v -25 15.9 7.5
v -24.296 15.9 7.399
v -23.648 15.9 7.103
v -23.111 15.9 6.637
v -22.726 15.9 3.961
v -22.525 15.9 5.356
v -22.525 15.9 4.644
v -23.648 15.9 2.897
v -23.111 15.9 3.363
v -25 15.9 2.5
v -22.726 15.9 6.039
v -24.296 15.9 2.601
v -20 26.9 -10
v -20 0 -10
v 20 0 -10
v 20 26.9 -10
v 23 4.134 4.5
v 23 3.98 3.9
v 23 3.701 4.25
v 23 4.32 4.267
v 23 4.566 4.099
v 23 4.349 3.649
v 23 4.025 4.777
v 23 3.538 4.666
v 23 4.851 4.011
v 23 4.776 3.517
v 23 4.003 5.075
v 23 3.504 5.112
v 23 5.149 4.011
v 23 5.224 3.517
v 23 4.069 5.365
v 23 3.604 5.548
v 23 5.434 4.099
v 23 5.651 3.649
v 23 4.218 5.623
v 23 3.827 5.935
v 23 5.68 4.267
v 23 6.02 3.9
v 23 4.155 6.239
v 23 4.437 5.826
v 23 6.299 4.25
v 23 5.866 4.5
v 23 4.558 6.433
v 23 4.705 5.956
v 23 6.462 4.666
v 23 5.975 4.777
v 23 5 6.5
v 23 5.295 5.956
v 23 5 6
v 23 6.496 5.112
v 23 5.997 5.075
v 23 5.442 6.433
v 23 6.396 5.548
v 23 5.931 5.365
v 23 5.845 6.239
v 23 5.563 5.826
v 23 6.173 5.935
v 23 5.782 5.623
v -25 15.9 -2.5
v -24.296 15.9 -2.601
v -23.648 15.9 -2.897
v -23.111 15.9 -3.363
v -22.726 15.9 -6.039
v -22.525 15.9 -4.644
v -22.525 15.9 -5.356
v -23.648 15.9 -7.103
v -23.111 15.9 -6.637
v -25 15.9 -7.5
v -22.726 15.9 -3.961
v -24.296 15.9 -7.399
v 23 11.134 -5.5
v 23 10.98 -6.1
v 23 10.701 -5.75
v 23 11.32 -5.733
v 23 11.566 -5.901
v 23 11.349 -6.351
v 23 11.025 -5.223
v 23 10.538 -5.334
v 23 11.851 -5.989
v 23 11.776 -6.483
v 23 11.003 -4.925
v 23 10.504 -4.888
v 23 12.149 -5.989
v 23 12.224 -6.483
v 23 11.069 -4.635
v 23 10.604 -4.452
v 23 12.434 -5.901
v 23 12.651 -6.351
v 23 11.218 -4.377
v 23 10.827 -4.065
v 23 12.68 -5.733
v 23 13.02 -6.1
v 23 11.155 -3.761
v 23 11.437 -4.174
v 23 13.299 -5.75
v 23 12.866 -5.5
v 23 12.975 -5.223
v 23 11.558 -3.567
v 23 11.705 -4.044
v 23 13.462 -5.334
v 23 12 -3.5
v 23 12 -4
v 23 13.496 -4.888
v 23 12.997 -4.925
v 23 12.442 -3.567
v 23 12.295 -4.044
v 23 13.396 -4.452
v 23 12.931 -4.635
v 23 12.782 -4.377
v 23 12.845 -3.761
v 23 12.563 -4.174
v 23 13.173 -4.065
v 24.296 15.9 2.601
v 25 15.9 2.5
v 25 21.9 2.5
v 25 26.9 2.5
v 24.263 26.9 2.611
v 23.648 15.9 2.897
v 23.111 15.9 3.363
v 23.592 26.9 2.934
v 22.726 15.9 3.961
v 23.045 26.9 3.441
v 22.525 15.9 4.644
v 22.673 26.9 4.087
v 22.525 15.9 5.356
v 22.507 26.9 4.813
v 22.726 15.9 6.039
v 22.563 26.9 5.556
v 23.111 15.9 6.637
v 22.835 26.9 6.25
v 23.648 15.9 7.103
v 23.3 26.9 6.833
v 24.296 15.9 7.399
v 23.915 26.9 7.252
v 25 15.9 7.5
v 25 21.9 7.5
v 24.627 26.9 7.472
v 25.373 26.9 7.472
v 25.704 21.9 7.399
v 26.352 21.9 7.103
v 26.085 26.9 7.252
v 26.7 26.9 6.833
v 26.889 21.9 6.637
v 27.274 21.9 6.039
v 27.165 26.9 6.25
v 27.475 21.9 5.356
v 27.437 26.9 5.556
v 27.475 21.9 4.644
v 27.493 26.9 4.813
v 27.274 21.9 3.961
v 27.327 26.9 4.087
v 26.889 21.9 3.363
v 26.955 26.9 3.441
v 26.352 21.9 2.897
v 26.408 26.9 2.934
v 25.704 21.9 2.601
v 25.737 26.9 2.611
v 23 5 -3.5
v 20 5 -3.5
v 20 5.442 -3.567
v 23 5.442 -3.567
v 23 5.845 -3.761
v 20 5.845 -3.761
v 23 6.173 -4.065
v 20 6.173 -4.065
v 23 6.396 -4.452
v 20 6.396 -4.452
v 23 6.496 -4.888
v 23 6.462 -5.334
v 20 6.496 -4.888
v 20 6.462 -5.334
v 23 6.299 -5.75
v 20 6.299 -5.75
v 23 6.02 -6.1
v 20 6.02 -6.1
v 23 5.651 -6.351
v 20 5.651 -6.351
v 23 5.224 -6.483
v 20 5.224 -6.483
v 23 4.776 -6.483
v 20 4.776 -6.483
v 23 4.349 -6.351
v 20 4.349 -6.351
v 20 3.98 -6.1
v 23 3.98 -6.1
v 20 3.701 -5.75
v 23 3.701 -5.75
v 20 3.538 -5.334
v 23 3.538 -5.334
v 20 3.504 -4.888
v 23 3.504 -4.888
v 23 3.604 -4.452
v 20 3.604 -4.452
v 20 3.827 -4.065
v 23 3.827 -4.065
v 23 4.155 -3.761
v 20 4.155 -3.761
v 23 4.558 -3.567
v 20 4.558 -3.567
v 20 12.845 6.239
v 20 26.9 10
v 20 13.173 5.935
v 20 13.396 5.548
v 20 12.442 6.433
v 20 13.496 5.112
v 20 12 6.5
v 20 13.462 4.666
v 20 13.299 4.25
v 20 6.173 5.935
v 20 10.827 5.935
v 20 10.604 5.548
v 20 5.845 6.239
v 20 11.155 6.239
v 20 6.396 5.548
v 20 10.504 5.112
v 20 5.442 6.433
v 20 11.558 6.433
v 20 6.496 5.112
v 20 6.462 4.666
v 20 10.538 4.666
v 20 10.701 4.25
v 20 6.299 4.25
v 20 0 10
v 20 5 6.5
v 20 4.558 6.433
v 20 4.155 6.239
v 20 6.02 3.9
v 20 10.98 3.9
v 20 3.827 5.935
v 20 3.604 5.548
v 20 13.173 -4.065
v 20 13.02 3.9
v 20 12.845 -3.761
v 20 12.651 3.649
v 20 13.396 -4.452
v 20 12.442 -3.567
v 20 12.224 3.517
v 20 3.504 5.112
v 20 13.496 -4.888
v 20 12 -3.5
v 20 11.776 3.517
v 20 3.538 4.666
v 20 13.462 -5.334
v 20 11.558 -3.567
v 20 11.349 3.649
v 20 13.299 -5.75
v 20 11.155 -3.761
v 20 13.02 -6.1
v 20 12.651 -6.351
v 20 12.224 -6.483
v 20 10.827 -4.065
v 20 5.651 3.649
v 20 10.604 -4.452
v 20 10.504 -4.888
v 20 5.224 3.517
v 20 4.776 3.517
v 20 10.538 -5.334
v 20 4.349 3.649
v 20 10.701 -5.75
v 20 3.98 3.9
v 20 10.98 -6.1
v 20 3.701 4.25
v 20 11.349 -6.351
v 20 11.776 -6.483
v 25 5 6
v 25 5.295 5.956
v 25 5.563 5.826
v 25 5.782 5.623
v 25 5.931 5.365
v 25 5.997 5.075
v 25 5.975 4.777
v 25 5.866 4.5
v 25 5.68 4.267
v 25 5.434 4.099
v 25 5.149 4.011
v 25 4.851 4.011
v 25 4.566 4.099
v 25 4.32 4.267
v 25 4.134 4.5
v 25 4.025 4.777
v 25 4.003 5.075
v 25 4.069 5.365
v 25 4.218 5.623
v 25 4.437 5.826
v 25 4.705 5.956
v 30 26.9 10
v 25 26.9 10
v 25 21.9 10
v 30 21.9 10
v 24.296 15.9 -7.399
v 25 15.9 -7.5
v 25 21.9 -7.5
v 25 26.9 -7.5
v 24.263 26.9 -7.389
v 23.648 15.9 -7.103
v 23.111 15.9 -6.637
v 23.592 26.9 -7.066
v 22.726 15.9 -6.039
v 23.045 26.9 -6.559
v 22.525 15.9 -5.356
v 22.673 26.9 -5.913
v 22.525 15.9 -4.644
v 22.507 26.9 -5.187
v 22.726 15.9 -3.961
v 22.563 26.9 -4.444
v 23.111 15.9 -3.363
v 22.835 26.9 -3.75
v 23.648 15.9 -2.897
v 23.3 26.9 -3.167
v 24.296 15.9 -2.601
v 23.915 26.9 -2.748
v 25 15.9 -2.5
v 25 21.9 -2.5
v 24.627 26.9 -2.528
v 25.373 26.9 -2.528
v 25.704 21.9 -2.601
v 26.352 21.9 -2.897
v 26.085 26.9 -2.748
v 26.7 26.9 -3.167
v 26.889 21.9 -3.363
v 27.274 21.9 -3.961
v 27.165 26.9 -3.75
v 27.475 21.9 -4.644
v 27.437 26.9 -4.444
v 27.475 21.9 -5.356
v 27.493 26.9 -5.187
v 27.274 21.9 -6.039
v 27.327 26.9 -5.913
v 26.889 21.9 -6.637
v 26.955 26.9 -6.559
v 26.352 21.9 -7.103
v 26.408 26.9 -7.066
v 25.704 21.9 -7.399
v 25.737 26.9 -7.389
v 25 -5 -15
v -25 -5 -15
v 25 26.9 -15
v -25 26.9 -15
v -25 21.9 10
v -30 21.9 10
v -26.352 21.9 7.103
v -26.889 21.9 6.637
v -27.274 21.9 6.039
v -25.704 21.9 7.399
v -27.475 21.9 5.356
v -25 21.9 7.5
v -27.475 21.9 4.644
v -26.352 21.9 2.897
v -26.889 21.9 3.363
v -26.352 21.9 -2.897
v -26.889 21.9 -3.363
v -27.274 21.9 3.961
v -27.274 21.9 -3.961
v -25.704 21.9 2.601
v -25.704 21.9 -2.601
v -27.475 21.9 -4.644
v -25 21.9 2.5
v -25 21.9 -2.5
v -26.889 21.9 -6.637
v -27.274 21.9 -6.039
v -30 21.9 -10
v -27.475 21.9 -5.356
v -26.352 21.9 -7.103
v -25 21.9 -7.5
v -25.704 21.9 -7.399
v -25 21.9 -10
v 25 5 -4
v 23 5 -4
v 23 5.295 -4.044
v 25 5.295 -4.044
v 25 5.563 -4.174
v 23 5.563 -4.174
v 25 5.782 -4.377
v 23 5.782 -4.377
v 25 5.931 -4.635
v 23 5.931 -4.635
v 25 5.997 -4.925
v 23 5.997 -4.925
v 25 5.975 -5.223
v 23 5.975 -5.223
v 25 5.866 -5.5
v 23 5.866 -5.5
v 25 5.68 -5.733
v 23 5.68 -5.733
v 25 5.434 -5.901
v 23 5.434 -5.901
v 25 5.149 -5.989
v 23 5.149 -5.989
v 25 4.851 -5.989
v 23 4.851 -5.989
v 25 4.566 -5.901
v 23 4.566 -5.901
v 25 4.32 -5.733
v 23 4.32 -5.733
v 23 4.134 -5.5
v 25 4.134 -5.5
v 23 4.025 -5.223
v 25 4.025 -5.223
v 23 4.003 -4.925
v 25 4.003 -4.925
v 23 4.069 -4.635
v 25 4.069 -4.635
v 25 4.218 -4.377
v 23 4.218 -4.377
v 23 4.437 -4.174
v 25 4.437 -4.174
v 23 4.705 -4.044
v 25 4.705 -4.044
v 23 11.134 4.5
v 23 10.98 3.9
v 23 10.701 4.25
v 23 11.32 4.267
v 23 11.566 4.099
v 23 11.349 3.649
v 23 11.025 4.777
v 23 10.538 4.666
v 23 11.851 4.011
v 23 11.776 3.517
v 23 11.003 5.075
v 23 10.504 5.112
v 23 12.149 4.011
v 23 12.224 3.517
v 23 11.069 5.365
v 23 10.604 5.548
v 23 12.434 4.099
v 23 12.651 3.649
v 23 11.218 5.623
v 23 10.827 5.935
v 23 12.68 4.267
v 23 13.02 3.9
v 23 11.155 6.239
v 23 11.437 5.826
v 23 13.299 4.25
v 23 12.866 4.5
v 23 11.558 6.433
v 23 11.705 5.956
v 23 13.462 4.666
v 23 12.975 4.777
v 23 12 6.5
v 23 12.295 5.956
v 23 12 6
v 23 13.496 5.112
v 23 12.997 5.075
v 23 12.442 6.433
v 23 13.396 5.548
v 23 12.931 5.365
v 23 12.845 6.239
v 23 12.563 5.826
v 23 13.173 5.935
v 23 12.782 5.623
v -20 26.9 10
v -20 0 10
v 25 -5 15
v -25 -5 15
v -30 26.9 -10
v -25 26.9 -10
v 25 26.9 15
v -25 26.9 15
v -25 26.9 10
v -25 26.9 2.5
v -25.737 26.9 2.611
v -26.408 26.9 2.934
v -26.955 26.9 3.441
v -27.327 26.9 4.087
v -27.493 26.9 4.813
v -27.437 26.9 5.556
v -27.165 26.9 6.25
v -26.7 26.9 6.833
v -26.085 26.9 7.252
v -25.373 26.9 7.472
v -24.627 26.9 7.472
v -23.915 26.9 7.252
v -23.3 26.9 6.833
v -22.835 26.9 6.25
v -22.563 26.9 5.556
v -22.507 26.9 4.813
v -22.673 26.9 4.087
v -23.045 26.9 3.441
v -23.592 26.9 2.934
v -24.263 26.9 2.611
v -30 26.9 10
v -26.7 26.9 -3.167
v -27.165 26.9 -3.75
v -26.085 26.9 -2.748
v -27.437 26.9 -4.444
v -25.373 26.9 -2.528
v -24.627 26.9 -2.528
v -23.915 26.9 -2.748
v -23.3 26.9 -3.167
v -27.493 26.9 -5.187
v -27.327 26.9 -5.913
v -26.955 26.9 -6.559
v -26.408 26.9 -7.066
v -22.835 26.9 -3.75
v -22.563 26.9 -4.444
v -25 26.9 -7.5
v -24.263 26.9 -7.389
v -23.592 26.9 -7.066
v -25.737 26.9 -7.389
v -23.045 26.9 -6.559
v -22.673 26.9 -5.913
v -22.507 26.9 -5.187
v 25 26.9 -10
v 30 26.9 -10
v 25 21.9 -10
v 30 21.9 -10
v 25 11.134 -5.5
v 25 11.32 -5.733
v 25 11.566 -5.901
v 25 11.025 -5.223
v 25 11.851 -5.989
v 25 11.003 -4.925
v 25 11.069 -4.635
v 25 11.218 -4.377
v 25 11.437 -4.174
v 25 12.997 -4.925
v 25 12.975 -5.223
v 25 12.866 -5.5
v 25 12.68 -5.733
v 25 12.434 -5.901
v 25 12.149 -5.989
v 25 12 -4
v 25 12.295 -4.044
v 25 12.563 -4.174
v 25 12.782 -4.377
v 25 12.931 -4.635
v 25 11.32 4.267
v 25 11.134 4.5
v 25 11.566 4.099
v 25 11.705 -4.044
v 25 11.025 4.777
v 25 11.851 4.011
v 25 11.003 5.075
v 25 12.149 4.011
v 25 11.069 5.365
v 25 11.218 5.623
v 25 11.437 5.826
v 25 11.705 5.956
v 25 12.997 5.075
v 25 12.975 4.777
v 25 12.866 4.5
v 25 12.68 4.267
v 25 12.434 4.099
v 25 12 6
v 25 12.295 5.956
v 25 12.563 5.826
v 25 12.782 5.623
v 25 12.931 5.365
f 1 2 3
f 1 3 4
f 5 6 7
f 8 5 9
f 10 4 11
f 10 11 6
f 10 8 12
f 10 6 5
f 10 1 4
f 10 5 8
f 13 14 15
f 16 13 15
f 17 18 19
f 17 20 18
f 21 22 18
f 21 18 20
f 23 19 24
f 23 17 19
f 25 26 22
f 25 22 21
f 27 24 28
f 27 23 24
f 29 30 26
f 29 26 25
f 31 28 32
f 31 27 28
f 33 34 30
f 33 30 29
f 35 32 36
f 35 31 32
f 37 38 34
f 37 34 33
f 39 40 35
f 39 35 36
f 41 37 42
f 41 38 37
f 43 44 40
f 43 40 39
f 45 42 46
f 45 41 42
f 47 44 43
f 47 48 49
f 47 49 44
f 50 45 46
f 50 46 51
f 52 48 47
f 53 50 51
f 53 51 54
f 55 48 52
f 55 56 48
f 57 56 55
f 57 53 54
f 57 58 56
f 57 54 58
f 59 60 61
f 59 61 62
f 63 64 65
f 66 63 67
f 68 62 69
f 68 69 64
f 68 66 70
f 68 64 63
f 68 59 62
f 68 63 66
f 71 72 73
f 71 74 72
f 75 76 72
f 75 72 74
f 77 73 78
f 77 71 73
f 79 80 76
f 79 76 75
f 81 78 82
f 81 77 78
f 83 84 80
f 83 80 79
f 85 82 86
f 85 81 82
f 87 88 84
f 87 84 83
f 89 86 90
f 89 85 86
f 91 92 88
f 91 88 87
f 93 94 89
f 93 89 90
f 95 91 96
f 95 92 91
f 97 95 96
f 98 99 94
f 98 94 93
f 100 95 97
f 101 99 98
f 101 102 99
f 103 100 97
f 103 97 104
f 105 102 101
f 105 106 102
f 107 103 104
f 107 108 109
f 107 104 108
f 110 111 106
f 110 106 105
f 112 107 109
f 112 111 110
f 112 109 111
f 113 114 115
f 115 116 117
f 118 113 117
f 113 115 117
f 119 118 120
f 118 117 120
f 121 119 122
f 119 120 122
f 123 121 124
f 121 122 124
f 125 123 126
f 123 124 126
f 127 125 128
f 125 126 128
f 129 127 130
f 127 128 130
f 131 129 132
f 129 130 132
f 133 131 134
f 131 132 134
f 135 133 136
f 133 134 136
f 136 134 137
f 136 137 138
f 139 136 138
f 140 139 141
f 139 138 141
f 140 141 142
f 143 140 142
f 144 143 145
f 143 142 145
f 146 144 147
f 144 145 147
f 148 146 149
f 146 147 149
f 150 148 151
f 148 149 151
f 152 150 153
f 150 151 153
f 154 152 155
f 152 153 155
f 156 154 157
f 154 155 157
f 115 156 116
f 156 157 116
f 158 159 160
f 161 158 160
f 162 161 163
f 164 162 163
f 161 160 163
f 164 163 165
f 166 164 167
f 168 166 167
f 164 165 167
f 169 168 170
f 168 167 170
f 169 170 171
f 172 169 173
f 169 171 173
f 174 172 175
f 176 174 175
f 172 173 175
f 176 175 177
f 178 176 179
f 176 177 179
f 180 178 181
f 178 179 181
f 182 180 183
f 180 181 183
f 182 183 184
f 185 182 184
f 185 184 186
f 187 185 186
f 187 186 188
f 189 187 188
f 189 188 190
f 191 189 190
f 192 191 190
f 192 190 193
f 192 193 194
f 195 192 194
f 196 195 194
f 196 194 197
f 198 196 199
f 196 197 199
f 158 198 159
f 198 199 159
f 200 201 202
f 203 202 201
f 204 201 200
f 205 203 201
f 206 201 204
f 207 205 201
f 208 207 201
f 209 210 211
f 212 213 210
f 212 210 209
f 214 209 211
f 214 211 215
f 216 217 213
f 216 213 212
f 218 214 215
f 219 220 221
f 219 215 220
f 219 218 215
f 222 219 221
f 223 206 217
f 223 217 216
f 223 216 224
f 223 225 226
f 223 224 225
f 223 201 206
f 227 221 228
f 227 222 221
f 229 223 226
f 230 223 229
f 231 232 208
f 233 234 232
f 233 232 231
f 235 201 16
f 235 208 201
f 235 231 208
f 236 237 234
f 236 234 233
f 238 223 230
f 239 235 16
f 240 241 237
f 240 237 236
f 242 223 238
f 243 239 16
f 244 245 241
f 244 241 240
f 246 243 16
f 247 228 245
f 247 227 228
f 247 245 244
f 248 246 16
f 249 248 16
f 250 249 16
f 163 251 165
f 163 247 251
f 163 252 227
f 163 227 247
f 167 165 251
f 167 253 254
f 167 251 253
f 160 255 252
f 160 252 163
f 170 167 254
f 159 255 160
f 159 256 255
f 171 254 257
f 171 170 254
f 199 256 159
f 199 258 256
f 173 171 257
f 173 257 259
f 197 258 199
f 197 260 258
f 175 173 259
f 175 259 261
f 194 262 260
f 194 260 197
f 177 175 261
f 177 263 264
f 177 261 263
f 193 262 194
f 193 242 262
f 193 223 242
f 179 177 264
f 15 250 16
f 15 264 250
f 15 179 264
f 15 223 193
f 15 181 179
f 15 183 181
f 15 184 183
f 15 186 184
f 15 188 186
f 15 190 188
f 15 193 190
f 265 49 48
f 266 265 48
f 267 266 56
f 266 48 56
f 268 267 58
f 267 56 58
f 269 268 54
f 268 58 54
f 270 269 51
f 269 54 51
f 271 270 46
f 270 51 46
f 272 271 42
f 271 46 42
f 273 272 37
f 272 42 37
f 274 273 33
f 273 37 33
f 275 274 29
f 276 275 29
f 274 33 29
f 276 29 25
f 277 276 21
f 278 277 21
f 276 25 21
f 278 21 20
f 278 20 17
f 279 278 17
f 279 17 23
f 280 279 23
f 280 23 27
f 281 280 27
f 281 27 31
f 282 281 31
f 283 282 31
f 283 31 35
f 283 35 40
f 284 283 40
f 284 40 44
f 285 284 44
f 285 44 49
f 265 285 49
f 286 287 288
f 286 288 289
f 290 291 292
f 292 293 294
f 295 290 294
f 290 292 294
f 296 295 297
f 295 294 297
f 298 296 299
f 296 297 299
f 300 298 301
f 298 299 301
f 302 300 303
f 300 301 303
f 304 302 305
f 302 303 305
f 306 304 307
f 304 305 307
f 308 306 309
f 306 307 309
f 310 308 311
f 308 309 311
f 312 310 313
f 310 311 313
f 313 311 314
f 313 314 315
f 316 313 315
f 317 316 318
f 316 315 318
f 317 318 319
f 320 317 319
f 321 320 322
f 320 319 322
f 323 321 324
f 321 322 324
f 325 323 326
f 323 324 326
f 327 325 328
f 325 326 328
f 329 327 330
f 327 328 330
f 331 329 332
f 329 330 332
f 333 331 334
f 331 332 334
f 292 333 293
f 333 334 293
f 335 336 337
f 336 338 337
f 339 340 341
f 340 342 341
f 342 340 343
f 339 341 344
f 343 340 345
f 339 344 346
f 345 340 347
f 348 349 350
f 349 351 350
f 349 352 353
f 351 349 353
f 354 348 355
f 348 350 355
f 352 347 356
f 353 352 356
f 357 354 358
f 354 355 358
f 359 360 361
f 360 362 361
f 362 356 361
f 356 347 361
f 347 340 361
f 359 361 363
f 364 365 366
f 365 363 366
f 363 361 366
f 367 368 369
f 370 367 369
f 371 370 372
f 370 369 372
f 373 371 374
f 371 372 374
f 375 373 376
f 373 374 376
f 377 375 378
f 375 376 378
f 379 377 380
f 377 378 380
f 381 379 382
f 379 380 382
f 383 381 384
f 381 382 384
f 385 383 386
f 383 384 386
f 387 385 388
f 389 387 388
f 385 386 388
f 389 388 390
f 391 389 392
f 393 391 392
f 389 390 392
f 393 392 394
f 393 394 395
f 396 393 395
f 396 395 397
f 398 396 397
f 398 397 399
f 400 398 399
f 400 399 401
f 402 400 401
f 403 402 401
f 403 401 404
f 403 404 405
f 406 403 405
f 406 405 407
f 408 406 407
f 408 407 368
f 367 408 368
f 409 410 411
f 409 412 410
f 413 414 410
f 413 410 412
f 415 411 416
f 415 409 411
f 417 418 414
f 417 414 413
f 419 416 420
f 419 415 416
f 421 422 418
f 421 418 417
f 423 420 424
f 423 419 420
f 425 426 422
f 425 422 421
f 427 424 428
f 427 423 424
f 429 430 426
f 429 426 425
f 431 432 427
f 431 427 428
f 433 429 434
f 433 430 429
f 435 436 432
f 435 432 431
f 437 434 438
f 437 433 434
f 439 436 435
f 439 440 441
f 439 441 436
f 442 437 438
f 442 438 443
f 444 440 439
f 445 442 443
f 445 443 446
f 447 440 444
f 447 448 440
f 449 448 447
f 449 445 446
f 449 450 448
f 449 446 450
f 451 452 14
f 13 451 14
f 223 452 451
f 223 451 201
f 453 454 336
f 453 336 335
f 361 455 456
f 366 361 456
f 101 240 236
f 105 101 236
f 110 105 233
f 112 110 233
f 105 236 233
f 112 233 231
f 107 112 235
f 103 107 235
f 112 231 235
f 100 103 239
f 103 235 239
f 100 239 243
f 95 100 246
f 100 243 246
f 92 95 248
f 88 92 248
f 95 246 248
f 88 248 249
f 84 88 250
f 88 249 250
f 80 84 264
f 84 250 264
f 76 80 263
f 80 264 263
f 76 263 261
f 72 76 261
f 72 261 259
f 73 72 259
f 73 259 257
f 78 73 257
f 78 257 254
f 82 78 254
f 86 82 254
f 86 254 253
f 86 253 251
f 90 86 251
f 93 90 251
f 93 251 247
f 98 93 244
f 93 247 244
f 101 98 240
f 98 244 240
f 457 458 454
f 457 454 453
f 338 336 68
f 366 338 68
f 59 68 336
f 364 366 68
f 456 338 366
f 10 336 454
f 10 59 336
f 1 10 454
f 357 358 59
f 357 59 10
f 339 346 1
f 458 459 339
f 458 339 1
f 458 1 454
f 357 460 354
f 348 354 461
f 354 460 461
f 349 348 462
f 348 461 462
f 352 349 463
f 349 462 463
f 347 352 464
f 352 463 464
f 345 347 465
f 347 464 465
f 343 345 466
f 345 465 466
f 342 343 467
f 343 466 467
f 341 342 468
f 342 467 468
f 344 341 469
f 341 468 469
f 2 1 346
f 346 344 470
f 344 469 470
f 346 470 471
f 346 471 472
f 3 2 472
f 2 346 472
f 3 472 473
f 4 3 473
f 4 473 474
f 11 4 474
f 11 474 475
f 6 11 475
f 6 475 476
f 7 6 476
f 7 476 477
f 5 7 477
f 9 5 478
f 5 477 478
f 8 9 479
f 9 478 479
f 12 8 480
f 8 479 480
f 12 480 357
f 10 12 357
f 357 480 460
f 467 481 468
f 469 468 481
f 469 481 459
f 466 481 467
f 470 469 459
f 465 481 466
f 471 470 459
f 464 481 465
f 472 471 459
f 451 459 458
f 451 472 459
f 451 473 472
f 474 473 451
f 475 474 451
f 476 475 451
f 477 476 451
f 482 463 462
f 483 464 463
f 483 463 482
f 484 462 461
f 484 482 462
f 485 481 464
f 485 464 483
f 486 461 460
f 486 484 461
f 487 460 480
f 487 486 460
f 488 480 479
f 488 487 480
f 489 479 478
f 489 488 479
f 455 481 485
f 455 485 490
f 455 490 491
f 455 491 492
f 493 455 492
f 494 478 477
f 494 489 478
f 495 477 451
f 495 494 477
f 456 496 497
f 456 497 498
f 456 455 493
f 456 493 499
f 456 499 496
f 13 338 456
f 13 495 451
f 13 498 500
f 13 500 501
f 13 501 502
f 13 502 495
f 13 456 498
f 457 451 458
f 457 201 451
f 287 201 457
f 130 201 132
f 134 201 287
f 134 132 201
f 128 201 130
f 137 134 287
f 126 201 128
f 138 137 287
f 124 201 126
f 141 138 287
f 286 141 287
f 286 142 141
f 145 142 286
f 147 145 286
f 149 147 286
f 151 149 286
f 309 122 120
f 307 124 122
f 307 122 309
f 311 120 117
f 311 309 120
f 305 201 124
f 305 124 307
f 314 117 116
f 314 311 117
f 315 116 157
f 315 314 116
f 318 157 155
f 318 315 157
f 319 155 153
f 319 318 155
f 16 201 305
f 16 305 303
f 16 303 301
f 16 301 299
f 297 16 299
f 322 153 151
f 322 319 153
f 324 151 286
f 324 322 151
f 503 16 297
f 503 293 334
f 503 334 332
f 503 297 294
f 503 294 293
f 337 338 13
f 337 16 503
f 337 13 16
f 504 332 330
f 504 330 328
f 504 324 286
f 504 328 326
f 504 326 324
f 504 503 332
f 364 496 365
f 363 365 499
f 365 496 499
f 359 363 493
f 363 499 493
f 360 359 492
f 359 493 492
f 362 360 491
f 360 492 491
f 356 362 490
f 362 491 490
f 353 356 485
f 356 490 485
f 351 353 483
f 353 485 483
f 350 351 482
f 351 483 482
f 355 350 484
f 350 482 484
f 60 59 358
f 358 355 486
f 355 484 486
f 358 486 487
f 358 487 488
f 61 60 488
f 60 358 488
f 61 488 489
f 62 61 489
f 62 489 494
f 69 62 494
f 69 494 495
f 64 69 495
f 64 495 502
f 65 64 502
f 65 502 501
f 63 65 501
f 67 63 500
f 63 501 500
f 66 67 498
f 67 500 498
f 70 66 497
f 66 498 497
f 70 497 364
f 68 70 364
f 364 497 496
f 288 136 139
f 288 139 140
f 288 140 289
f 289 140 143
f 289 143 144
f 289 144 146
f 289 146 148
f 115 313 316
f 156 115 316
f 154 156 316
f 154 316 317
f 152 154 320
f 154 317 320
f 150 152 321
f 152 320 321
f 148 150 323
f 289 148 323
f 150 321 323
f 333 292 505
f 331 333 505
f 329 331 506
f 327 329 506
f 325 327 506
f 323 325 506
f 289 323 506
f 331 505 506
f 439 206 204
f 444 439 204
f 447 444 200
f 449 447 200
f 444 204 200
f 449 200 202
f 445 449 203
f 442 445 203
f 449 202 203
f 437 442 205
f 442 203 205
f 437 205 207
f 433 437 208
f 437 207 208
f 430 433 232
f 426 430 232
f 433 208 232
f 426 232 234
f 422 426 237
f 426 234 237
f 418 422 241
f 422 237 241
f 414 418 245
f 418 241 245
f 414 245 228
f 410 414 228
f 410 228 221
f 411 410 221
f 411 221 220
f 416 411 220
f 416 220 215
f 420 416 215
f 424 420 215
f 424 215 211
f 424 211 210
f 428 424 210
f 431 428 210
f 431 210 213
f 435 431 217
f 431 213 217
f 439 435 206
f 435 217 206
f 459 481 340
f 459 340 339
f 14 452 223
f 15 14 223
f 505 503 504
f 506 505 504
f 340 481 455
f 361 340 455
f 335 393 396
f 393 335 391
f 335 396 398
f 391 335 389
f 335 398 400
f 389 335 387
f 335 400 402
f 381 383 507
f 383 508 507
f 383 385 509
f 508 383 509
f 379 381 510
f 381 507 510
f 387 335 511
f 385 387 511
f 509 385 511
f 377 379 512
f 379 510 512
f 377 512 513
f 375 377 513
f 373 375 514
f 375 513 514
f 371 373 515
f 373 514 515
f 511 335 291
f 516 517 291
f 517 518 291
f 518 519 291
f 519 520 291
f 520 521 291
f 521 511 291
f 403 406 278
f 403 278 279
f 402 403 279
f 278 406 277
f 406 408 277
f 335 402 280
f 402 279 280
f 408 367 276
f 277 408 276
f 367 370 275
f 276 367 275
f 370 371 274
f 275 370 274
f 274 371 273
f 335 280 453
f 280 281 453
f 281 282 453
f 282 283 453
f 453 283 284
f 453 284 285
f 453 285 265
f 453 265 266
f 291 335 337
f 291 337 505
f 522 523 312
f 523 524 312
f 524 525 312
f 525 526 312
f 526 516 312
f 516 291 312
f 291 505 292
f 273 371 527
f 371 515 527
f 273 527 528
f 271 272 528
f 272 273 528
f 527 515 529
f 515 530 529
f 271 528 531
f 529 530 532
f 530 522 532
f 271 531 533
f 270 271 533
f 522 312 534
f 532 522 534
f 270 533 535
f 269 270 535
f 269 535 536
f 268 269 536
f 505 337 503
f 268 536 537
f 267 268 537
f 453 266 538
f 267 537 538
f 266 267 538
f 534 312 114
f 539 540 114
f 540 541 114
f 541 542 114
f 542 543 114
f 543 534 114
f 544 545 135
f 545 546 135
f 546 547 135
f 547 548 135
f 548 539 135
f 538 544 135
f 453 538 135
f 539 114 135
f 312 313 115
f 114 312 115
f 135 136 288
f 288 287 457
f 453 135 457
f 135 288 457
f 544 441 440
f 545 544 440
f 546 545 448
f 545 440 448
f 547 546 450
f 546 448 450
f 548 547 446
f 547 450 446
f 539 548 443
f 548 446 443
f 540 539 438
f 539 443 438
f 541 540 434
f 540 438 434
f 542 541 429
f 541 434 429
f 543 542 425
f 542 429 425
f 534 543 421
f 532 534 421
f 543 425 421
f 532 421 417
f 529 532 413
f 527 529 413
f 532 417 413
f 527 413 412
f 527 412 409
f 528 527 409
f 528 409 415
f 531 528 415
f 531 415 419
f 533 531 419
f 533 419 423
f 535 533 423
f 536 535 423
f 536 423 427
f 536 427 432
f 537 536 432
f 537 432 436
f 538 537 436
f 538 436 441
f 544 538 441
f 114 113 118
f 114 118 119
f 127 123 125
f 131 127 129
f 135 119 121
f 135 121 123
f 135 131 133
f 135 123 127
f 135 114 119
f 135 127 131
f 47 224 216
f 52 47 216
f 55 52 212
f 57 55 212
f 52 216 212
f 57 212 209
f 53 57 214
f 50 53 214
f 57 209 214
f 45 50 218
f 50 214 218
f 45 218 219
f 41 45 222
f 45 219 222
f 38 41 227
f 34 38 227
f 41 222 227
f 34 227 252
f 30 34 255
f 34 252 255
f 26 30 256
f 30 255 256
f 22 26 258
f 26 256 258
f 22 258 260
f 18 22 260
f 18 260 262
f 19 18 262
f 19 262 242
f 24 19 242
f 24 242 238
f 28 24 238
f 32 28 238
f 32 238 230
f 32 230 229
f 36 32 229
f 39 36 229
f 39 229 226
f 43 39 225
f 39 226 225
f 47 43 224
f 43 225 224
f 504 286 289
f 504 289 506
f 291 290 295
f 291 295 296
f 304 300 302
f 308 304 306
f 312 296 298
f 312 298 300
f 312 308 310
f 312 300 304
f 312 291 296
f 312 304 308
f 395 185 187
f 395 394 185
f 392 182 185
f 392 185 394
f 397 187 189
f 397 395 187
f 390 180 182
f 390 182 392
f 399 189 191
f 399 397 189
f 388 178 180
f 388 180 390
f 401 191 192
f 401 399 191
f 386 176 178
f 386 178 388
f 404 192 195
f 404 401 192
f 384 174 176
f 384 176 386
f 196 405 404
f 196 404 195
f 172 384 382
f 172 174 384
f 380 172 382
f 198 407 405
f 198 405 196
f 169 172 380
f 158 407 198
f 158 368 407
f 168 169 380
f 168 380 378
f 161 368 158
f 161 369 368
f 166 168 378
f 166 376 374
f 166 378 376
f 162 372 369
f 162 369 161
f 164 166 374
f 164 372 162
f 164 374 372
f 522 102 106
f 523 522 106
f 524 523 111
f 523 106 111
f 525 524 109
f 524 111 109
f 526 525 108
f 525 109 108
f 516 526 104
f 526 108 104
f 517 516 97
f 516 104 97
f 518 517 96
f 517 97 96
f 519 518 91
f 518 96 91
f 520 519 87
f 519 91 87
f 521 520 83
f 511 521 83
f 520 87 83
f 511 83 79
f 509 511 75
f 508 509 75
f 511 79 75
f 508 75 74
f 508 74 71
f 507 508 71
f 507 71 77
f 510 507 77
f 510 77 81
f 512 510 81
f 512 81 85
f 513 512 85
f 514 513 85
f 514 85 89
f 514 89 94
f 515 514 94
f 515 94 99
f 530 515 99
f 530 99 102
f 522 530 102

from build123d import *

# Parameters (mm, degrees)
SKETCH1_W           = 50
SKETCH1_H           = 30
SKETCH1_W_2         = 40
SKETCH1_H_2         = 20
BOSS_EXTRUDE1_DEPTH = 26.9
SKETCH2_W           = 10
SKETCH2_H           = 20
SKETCH2_R           = 2.5
BOSS_EXTRUDE2_DEPTH = 5
SKETCH3_R           = 2.5
CUT_EXTRUDE1_DEPTH  = 11
SKETCH5_R           = 1.5
CUT_EXTRUDE3_DEPTH  = 3
SKETCH6_R           = 1
CUT_EXTRUDE4_DEPTH  = 9
SKETCH7_W           = 50
SKETCH7_H           = 30
BOSS_EXTRUDE3_DEPTH = 5


with BuildPart() as part:
    # Sketch1 → Boss-Extrude1 (new body)
    with BuildSketch(Plane(origin=(0, 0, 0), x_dir=(1, 0, 0), z_dir=(0, 1, 0))):
        Rectangle(SKETCH1_W, SKETCH1_H)
        Rectangle(SKETCH1_W_2, SKETCH1_H_2, mode=Mode.SUBTRACT)
    extrude(amount=BOSS_EXTRUDE1_DEPTH)

    # Sketch2 → Boss-Extrude2 (add)
    # profile 1 of 2: a face of its own
    with BuildSketch(Plane(origin=(0, 26.9, 0), x_dir=(1, 0, 0), z_dir=(0, 1, 0))):
        with Locations((25, 0)):
            Rectangle(SKETCH2_W, SKETCH2_H)
        with Locations((25, 5)):
            Circle(SKETCH2_R, mode=Mode.SUBTRACT)
        with Locations((25, -5)):
            Circle(SKETCH2_R, mode=Mode.SUBTRACT)
    # profile 2 of 2: a face of its own
    with BuildSketch(Plane(origin=(0, 26.9, 0), x_dir=(1, 0, 0), z_dir=(0, 1, 0))):
        with Locations((-25, 0)):
            Rectangle(SKETCH2_W, SKETCH2_H)
        with Locations((-25, -5)):
            Circle(SKETCH2_R, mode=Mode.SUBTRACT)
        with Locations((-25, 5)):
            Circle(SKETCH2_R, mode=Mode.SUBTRACT)
    extrude(amount=-BOSS_EXTRUDE2_DEPTH)

    # Sketch3 → Cut-Extrude1 (cut)
    with BuildSketch(Plane(origin=(0, 26.9, 0), x_dir=(1, 0, 0), z_dir=(0, 1, 0))):
        with Locations(Location((-25, 5, 0), (0, 0, 90))):
            Circle(SKETCH3_R)
        with Locations(Location((-25, -5, 0), (0, 0, 90))):
            Circle(SKETCH3_R)
        with Locations(Location((25, -5, 0), (0, 0, 270))):
            Circle(SKETCH3_R)
        with Locations(Location((25, 5, 0), (0, 0, 270))):
            Circle(SKETCH3_R)
    extrude(amount=-CUT_EXTRUDE1_DEPTH, mode=Mode.SUBTRACT)

    # Sketch5 → Cut-Extrude3 (cut)
    with BuildSketch(Plane.ZY.offset(-20)):
        with Locations((-5, 12)):
            Circle(SKETCH5_R)
        with Locations((-5, 5)):
            Circle(SKETCH5_R)
        with Locations((5, 12)):
            Circle(SKETCH5_R)
        with Locations((5, 5)):
            Circle(SKETCH5_R)
    extrude(amount=-CUT_EXTRUDE3_DEPTH, mode=Mode.SUBTRACT)

    # Sketch6 → Cut-Extrude4 (cut)
    with BuildSketch(Plane.ZY.offset(-23)):
        with Locations((-5, 12)):
            Circle(SKETCH6_R)
        with Locations((5, 12)):
            Circle(SKETCH6_R)
        with Locations((-5, 5)):
            Circle(SKETCH6_R)
        with Locations((5, 5)):
            Circle(SKETCH6_R)
    extrude(amount=-CUT_EXTRUDE4_DEPTH, mode=Mode.SUBTRACT)

    # Sketch7 → Boss-Extrude3 (add)
    with BuildSketch(Plane.XZ):
        Rectangle(SKETCH7_W, SKETCH7_H)
    extrude(amount=BOSS_EXTRUDE3_DEPTH)


solid = part.part
